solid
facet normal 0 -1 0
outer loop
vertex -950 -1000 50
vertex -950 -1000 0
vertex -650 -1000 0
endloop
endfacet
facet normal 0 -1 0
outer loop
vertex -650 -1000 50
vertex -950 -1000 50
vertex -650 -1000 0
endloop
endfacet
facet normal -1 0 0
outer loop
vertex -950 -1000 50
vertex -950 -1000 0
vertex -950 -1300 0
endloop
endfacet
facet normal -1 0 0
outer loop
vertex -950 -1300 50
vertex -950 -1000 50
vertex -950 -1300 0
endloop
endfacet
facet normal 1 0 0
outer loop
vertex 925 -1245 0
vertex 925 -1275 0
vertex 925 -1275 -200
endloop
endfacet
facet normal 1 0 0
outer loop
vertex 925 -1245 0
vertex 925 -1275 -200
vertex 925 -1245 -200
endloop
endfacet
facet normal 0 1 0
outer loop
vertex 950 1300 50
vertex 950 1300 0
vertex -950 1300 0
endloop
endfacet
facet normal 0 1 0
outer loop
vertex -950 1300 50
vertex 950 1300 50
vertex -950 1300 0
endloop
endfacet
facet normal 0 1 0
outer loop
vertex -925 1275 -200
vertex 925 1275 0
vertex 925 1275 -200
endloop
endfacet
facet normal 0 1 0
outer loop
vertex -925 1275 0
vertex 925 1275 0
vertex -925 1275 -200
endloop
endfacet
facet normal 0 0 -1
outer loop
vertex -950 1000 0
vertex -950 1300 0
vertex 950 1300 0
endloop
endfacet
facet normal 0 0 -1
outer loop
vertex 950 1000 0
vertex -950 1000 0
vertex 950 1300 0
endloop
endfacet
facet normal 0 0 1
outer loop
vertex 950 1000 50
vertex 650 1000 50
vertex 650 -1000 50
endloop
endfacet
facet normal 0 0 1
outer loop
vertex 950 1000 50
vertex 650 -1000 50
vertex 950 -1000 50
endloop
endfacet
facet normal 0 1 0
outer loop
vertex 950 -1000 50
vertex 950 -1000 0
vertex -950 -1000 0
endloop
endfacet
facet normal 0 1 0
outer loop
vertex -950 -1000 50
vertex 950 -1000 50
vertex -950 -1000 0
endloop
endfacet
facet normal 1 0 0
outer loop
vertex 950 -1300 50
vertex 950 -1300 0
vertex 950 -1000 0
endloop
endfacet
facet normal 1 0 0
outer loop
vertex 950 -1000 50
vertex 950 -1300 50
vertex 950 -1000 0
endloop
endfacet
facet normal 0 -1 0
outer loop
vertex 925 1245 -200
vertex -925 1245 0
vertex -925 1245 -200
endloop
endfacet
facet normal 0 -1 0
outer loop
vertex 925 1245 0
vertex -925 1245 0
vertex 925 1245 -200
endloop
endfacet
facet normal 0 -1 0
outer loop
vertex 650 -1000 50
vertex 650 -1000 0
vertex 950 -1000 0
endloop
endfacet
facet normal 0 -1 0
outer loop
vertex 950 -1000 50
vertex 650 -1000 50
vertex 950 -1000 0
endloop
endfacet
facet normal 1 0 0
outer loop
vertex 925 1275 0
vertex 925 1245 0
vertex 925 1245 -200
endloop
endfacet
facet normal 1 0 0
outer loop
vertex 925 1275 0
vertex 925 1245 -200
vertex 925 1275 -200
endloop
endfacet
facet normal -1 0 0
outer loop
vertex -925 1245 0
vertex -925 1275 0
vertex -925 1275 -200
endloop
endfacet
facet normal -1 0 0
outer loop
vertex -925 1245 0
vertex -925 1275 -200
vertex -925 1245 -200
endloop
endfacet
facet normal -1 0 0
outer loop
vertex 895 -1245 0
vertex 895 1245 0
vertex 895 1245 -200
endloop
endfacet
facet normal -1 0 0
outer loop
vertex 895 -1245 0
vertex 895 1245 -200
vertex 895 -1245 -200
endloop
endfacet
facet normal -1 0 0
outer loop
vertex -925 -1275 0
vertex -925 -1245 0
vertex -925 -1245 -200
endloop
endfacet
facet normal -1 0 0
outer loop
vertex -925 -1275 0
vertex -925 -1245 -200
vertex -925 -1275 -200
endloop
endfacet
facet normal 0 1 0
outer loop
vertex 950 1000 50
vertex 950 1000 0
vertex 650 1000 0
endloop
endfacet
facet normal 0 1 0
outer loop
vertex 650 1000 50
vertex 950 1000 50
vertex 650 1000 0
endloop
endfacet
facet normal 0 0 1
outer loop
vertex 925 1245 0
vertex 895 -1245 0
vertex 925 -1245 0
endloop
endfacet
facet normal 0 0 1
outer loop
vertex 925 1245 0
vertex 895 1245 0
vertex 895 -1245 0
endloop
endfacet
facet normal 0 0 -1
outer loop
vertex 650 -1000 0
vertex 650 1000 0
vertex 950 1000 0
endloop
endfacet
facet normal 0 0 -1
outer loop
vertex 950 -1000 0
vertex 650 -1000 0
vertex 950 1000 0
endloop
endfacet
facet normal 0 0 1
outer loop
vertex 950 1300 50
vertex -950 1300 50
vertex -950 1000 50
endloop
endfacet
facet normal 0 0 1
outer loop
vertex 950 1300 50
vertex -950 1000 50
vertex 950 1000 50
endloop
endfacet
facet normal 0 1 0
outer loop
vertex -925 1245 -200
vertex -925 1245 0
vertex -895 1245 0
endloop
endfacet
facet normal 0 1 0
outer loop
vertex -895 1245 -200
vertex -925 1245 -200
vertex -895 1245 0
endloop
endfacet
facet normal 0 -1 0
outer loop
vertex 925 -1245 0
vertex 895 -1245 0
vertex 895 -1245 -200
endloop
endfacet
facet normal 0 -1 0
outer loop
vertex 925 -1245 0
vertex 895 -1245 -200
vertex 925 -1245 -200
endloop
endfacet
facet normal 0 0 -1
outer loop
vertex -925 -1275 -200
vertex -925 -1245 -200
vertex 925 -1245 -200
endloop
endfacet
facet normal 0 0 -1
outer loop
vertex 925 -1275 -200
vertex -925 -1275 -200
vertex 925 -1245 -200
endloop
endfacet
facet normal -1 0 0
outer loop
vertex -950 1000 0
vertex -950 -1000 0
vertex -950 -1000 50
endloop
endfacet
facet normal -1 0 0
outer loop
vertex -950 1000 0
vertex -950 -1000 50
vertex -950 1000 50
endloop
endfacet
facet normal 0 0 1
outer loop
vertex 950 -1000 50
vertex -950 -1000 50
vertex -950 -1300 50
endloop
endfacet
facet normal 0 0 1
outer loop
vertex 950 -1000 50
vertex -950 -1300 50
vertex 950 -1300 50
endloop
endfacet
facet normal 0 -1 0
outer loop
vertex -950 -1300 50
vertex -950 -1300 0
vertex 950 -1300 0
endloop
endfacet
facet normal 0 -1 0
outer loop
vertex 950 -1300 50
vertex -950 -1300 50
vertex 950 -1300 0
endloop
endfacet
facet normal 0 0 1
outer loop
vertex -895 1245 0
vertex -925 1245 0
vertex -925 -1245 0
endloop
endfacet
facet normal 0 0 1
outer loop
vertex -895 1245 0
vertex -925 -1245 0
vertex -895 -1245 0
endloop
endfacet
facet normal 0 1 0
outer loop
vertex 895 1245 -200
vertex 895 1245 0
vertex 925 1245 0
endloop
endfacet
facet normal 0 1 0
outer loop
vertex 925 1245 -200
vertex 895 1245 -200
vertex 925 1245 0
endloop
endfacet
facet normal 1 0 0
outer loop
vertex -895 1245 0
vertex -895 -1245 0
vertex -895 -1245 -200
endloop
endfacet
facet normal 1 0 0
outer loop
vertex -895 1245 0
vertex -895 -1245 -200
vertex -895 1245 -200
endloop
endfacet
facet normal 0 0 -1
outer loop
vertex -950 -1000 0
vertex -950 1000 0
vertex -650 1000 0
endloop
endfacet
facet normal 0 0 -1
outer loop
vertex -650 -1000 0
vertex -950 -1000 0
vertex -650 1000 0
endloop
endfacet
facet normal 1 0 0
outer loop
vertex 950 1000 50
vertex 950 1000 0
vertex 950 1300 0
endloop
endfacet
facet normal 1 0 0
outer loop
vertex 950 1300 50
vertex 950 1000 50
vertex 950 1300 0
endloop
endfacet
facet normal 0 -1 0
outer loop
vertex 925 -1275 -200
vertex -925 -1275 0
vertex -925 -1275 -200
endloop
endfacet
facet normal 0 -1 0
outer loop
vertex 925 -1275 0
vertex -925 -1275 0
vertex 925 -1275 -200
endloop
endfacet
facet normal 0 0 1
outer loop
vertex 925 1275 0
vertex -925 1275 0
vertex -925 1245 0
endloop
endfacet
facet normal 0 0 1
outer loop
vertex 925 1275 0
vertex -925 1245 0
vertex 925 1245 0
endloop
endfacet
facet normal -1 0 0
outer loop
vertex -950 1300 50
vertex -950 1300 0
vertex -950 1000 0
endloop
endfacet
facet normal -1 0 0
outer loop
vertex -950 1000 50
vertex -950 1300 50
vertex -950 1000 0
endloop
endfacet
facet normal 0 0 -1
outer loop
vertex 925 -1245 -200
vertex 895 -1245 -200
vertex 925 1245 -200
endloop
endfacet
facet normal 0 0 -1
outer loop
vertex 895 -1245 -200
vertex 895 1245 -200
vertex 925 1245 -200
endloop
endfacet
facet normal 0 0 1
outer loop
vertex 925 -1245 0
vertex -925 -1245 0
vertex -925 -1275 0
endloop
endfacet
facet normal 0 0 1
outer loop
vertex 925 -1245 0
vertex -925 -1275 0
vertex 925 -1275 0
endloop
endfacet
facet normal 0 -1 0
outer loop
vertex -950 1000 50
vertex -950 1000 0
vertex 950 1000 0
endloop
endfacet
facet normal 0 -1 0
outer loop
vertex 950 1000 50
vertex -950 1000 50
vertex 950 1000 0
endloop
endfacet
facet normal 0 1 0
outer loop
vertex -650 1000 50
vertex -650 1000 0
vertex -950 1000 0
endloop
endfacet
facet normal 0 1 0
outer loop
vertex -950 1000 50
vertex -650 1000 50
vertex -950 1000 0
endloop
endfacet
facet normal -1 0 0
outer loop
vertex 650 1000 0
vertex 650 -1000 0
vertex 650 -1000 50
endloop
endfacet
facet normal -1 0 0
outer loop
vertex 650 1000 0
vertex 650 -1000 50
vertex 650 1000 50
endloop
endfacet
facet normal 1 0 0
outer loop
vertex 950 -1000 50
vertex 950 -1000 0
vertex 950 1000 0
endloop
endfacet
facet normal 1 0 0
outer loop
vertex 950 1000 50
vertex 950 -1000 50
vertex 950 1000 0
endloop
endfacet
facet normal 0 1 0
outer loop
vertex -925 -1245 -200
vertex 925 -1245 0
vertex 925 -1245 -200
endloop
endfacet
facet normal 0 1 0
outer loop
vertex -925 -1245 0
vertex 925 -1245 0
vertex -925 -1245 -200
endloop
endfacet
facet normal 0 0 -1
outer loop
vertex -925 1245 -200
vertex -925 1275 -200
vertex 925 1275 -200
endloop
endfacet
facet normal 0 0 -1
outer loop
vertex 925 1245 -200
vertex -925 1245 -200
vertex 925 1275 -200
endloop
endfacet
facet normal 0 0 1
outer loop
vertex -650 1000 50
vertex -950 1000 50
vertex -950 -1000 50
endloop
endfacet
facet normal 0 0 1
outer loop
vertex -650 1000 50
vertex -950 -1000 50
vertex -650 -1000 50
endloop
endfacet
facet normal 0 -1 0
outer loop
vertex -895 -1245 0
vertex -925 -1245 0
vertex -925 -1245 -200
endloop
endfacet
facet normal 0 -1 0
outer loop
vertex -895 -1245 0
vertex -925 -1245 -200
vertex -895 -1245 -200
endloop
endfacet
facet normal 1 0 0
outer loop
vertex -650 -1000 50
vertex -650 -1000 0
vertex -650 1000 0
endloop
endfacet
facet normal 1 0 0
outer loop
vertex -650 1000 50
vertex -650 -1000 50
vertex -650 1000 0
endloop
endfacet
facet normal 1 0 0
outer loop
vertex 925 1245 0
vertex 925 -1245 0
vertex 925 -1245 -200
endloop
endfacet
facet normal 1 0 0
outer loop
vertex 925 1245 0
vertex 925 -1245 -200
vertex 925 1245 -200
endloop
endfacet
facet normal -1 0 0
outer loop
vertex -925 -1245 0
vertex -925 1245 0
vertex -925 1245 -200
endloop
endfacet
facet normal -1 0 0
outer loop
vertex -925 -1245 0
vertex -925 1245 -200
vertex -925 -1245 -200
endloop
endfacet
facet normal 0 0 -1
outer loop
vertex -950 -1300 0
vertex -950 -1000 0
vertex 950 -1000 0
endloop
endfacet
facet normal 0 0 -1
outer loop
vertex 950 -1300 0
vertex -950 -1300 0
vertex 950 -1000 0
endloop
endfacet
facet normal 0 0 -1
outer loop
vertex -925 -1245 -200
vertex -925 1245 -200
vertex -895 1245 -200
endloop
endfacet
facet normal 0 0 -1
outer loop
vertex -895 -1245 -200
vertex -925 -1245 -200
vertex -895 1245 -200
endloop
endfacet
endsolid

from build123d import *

# Parameters (mm, degrees)
F0_W     = 225
F0_H     = 2000
F0_W_2   = 30
F0_W_3   = 25
F0_W_4   = 20
F1_DEPTH = 50
F0_H_2   = 245
F2_DEPTH = 50
F3_DEPTH = 200
F4_DEPTH = 200


with BuildPart() as f1:
    # F0 (on Top) → F1 (new body)
    with BuildSketch(Plane.XY):
        with Locations((-762.5, 0)):
            Rectangle(F0_W, F0_H)
        with Locations((-910, 0)):
            Rectangle(F0_W_2, F0_H)
        with Locations((-937.5, 0)):
            Rectangle(F0_W_3, F0_H)
        with Locations((-885, 0)):
            Rectangle(F0_W_4, F0_H)
    extrude(amount=F1_DEPTH)


with BuildPart() as f1b:
    # F0 (on Top) → F1, piece 2 (new body)
    with BuildSketch(Plane.XY):
        with Locations((762.5, 0)):
            Rectangle(F0_W, F0_H)
        with Locations((910, 0)):
            Rectangle(F0_W_2, F0_H)
        with Locations((937.5, 0)):
            Rectangle(F0_W_3, F0_H)
        with Locations((885, 0)):
            Rectangle(F0_W_4, F0_H)
    extrude(amount=F1_DEPTH)


with BuildPart() as f2:
    # F0 (on Top) → F2 (new body)
    with BuildSketch(Plane.XY):
        Polygon((-875, 1225), (-875, 1000), (-650, 1000), (650, 1000), (875, 1000), (875, 1225), align=None)
        with Locations((-910, 1122.5)):
            Rectangle(F0_W_2, F0_H_2)
        Polygon((-925, 1275), (-925, 1245), (-895, 1245), (895, 1245), (925, 1245), (925, 1275), align=None)
        Polygon((-950, 1300), (-950, 1000), (-925, 1000), (-925, 1245), (-925, 1275), (925, 1275), (925, 1245), (925, 1000), (950, 1000), (950, 1300), align=None)
        with Locations((910, 1122.5)):
            Rectangle(F0_W_2, F0_H_2)
        Polygon((-895, 1245), (-895, 1000), (-875, 1000), (-875, 1225), (875, 1225), (875, 1000), (895, 1000), (895, 1245), align=None)
    extrude(amount=F2_DEPTH)


with BuildPart() as f2b:
    # F0 (on Top) → F2, piece 2 (new body)
    with BuildSketch(Plane.XY):
        Polygon((-650, -1000), (-875, -1000), (-875, -1225), (875, -1225), (875, -1000), (650, -1000), align=None)
        with Locations((-910, -1122.5)):
            Rectangle(F0_W_2, F0_H_2)
        Polygon((-950, -1000), (-950, -1300), (950, -1300), (950, -1000), (925, -1000), (925, -1245), (925, -1275), (-925, -1275), (-925, -1245), (-925, -1000), align=None)
        Polygon((-895, -1245), (-925, -1245), (-925, -1275), (925, -1275), (925, -1245), (895, -1245), align=None)
        with Locations((910, -1122.5)):
            Rectangle(F0_W_2, F0_H_2)
        Polygon((-875, -1000), (-895, -1000), (-895, -1245), (895, -1245), (895, -1000), (875, -1000), (875, -1225), (-875, -1225), align=None)
    extrude(amount=F2_DEPTH)


with BuildPart() as f3:
    # F0 (on Top) → F3 (new body)
    with BuildSketch(Plane.XY):
        with Locations((-910, 1122.5)):
            Rectangle(F0_W_2, F0_H_2)
        with Locations((-910, 0)):
            Rectangle(F0_W_2, F0_H)
        with Locations((-910, -1122.5)):
            Rectangle(F0_W_2, F0_H_2)
    extrude(amount=-F3_DEPTH)


with BuildPart() as f3b:
    # F0 (on Top) → F3, piece 2 (new body)
    with BuildSketch(Plane.XY):
        with Locations((910, -1122.5)):
            Rectangle(F0_W_2, F0_H_2)
        with Locations((910, 0)):
            Rectangle(F0_W_2, F0_H)
        with Locations((910, 1122.5)):
            Rectangle(F0_W_2, F0_H_2)
    extrude(amount=-F3_DEPTH)


with BuildPart() as f4:
    # F0 (on Top) → F4 (new body)
    with BuildSketch(Plane.XY):
        Polygon((-925, 1275), (-925, 1245), (-895, 1245), (895, 1245), (925, 1245), (925, 1275), align=None)
    extrude(amount=-F4_DEPTH)


with BuildPart() as f4b:
    # F0 (on Top) → F4, piece 2 (new body)
    with BuildSketch(Plane.XY):
        Polygon((-895, -1245), (-925, -1245), (-925, -1275), (925, -1275), (925, -1245), (895, -1245), align=None)
    extrude(amount=-F4_DEPTH)


solid = Compound([f1.part, f1b.part, f2.part, f2b.part, f3.part, f3b.part, f4.part, f4b.part])
